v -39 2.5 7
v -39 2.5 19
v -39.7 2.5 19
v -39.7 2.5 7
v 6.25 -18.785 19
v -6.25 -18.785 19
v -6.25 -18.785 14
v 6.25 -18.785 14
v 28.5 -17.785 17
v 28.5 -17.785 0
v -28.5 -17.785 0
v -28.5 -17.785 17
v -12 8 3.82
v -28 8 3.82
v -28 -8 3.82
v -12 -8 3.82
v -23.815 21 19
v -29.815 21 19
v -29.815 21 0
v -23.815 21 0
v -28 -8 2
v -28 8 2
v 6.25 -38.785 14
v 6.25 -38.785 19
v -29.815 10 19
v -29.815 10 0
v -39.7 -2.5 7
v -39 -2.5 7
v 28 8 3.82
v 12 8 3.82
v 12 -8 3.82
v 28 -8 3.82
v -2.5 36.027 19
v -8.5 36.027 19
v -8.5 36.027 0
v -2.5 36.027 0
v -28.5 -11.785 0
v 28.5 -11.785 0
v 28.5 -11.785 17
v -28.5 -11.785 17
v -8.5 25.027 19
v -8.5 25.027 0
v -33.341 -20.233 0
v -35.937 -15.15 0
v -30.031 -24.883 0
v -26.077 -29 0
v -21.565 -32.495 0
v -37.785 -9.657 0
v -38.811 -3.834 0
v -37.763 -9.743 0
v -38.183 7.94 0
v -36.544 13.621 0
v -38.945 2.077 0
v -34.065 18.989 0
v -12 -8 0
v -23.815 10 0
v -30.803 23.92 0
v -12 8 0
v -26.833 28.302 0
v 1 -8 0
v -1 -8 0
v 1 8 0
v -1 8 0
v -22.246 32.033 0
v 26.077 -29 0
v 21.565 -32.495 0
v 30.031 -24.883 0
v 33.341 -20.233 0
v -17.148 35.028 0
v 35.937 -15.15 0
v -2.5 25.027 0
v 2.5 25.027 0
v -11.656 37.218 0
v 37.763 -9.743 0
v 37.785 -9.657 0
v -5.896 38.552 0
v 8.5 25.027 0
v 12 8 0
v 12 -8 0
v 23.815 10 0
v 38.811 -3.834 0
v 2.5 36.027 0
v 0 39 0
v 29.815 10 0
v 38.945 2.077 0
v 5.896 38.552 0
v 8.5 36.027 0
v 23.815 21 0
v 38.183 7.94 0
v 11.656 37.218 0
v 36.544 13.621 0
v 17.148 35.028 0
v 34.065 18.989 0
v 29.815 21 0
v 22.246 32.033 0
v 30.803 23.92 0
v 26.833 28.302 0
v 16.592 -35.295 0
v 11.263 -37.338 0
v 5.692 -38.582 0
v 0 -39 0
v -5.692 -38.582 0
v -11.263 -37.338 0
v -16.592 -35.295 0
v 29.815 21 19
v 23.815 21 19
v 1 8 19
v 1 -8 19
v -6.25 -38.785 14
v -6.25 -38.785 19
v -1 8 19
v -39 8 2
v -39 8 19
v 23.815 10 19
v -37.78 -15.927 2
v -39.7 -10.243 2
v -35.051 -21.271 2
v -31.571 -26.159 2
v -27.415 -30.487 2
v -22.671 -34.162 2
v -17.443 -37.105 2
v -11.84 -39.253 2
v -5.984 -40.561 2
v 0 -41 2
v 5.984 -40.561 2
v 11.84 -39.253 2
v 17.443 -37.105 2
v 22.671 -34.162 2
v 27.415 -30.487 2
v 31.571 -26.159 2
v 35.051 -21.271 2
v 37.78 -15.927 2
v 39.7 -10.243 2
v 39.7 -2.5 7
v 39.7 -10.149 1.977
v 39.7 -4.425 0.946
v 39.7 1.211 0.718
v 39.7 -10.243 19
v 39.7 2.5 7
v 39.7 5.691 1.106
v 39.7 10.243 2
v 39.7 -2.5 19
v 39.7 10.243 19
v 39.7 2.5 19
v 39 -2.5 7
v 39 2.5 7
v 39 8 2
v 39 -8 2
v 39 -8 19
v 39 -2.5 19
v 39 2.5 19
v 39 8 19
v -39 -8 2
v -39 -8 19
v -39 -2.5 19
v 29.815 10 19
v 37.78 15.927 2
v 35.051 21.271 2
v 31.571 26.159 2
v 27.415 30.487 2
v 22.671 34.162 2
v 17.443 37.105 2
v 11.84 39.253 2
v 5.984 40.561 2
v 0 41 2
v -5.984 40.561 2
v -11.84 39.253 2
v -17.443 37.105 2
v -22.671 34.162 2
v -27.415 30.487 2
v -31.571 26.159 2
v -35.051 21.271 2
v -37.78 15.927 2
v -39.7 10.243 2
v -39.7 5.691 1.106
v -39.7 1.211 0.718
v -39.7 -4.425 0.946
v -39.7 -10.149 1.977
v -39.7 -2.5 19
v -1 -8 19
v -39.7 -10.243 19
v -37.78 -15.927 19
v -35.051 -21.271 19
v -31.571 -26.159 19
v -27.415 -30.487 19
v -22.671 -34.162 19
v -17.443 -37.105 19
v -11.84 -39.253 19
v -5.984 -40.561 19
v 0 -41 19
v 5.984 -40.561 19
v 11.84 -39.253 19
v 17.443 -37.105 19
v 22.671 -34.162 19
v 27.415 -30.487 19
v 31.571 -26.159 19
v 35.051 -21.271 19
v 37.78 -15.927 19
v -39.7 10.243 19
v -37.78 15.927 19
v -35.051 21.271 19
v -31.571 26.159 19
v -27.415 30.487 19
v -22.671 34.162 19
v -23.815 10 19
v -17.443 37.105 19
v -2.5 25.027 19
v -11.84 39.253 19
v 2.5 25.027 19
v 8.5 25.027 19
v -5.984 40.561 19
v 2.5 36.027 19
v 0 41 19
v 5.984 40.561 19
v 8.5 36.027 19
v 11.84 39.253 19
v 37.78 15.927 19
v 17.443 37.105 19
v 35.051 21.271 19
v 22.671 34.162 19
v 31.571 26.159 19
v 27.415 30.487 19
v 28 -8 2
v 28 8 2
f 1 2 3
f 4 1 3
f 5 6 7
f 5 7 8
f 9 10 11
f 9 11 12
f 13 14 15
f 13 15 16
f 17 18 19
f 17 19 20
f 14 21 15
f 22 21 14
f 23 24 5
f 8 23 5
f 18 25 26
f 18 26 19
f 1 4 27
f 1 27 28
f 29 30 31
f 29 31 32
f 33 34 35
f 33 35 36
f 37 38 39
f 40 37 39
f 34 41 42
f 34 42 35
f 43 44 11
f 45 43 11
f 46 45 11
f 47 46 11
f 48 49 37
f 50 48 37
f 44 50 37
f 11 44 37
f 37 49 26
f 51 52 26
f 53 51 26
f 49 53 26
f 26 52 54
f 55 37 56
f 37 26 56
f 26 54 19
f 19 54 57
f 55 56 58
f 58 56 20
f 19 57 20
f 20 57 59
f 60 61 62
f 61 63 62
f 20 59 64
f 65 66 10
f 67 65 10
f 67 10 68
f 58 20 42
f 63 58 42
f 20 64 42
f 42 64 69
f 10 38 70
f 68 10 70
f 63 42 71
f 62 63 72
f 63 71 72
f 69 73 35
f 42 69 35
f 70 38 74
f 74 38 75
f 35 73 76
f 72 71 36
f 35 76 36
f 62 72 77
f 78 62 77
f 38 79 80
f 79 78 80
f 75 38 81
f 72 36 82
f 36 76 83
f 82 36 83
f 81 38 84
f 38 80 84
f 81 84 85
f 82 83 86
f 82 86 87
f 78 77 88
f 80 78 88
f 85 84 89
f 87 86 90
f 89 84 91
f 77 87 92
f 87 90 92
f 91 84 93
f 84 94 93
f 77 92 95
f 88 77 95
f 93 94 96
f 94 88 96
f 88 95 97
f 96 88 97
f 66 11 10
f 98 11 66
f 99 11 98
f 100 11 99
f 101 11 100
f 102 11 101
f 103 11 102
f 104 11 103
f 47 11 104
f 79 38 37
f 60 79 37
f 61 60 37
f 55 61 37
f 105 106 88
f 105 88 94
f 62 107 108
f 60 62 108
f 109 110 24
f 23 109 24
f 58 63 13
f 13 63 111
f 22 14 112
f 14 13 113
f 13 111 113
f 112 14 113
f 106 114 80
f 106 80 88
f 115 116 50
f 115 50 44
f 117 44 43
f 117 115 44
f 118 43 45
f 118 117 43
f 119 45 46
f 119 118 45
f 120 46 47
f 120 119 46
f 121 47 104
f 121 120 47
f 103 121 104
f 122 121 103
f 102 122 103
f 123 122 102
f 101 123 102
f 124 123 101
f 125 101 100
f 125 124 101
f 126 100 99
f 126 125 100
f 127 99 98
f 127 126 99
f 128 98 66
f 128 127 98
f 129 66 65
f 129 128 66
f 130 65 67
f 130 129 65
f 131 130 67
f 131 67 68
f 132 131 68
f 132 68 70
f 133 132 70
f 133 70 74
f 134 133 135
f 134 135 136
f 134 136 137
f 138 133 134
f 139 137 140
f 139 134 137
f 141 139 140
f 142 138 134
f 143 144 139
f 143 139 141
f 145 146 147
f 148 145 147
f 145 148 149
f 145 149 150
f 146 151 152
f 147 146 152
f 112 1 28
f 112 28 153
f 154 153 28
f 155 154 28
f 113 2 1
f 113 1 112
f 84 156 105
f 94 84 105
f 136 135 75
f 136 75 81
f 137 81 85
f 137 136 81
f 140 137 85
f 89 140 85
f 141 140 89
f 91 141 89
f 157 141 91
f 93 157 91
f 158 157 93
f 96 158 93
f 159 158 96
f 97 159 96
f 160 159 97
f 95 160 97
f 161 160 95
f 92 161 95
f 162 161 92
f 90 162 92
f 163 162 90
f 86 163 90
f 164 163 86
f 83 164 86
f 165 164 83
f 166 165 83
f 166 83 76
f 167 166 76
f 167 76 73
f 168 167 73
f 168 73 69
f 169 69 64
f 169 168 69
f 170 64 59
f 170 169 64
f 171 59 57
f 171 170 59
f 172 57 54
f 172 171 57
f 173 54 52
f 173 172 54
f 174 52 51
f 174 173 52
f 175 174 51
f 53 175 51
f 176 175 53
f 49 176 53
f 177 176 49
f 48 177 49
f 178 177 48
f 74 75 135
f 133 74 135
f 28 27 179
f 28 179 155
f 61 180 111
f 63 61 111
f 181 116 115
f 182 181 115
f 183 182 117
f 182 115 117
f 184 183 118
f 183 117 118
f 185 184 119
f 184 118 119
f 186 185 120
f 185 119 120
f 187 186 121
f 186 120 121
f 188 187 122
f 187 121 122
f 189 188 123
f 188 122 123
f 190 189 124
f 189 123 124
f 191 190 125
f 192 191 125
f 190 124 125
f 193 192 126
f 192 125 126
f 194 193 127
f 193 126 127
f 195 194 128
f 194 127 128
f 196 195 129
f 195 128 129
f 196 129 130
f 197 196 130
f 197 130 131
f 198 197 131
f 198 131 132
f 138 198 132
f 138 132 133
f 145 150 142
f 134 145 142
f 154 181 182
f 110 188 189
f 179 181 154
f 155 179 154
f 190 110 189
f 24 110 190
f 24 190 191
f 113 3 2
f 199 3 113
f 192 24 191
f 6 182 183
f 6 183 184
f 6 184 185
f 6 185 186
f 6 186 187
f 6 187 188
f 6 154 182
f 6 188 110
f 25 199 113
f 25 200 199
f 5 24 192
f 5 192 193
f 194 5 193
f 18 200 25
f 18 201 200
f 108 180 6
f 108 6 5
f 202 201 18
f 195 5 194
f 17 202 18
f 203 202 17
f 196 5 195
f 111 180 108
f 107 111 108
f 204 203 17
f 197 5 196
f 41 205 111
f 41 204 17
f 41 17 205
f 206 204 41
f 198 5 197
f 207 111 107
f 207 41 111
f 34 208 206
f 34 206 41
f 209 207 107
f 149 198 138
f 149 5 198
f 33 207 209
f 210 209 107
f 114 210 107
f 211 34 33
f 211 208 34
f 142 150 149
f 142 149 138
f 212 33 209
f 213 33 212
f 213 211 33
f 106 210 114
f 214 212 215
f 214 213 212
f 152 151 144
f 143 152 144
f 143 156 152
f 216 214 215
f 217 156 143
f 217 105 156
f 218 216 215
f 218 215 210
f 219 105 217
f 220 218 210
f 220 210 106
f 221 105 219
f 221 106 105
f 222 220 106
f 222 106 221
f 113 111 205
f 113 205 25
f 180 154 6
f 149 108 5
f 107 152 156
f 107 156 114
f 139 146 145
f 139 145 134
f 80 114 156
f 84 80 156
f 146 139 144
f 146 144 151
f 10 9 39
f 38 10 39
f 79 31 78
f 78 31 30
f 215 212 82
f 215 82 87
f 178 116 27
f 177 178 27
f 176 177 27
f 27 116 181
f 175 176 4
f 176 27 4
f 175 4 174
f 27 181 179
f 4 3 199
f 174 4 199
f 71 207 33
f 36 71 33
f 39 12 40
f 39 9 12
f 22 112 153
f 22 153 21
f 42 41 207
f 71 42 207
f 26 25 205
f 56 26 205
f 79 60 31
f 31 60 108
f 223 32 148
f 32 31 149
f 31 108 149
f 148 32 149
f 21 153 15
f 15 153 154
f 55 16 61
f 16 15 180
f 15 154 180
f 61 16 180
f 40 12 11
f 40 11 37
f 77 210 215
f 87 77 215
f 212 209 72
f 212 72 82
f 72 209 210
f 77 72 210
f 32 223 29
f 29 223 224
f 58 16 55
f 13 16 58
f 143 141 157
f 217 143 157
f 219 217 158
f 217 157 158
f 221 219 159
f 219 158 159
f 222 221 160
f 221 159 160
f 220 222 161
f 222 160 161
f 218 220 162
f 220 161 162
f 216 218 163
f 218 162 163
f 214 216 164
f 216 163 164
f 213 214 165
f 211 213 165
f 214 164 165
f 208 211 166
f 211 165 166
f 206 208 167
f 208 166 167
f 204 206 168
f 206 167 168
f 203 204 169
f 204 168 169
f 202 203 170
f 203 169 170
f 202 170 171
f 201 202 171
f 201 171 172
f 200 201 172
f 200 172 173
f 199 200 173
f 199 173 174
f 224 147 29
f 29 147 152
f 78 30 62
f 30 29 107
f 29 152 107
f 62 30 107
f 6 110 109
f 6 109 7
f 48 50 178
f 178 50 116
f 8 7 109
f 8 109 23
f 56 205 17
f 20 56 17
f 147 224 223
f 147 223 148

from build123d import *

# Parameters (mm, degrees)
F0_R        = 41
F1_DEPTH    = 19
F3_DEPTH    = 17
F4_W        = 6
F4_H        = 11
F4_W_2      = 11
F4_H_2      = 16
F4_W_3      = 10.7800960541
F4_H_3      = 45.1917052269
F5_DEPTH    = 19.001
F7_START    = -12
F6_W        = 0.7
F6_H        = 5
F7_DEPTH    = 5
F8_W        = 16
F8_H        = 16
F9_DEPTH    = 1.82
F10_C1_SIZE = 2
F10_C2_SIZE = 1.9999
F11_W       = 12.5
F11_H       = 20
F12_DEPTH   = 5
F13_W       = 6
F13_H       = 35
F14_DEPTH   = 28.5


# Not quite as in the source:
# - a fillet or chamfer is up to 0.001 mm smaller than in the source, because OpenCascade refuses the exact size


with BuildPart() as f1:
    # F0 (on Top) → F1 (new body)
    with BuildSketch(Plane.XY):
        Circle(F0_R)
    extrude(amount=F1_DEPTH)

    # F2 (on face) → F3 (cut)
    with BuildSketch(Plane.XY.offset(19)):
        Polygon((39, 2.5), (39, 8), (1, 8), (1, -8), (39, -8), (39, -2.5), align=None)
        Polygon((-39, 8), (-39, 2.5), (-39, -2.5), (-39, -8), (-1, -8), (-1, 8), align=None)
        with BuildLine():
            Line((43, 2.5), (40.9237095093, 2.5))
            ThreePointArc((40.9237095093, 2.5), (40.9809229391, 1.2505818885), (41, 0))
            ThreePointArc((41, 0), (40.9809229391, -1.2505818885), (40.9237095093, -2.5))
            Line((40.9237095093, -2.5), (43, -2.5))
            Line((43, -2.5), (43, 2.5))
        make_face()
        with BuildLine():
            ThreePointArc((-40.9237095093, -2.5), (-41, 0), (-40.9237095093, 2.5))
            Line((-40.9237095093, 2.5), (-43, 2.5))
            Line((-43, 2.5), (-43, -2.5))
            Line((-43, -2.5), (-40.9237095093, -2.5))
        make_face()
        with BuildLine():
            Line((40.9237095093, 2.5), (39, 2.5))
            Line((39, 2.5), (39, -2.5))
            Line((39, -2.5), (40.9237095093, -2.5))
            ThreePointArc((40.9237095093, -2.5), (40.9809229391, -1.2505818885), (41, 0))
            ThreePointArc((41, 0), (40.9809229391, 1.2505818885), (40.9237095093, 2.5))
        make_face()
        with BuildLine():
            Line((-39, 2.5), (-40.9237095093, 2.5))
            ThreePointArc((-40.9237095093, 2.5), (-41, 0), (-40.9237095093, -2.5))
            Line((-40.9237095093, -2.5), (-39, -2.5))
            Line((-39, -2.5), (-39, 2.5))
        make_face()
    extrude(amount=-F3_DEPTH, mode=Mode.SUBTRACT)

    # F4 (on face) → F5 (cut, through all)
    with BuildSketch(Plane.XY.offset(19)):
        with Locations((-26.8149985671, 15.5)):
            Rectangle(F4_W, F4_H)
        with Locations((26.8149985671, 15.5)):
            Rectangle(F4_W, F4_H)
        with Locations((-5.5, 30.5270385295)):
            Rectangle(F4_W, F4_H)
        with Locations((5.5, 30.5270385295)):
            Rectangle(F4_W, F4_H)
        with Locations((-6.5, 0)):
            Rectangle(F4_W_2, F4_H_2)
        with Locations((6.5, 0)):
            Rectangle(F4_W_2, F4_H_2)
        with Locations((-45.090048027, 0)):
            Rectangle(F4_W_3, F4_H_3)
        with Locations((45.090048027, 0)):
            Rectangle(F4_W_3, F4_H_3)
    extrude(amount=-F5_DEPTH, mode=Mode.SUBTRACT)

    # F6 (on face) → F7 (join)
    with BuildSketch(Plane.XY.offset(19).offset(F7_START)):
        with Locations((-39.35, 0)):
            Rectangle(F6_W, F6_H)
        with Locations((39.35, 0)):
            Rectangle(F6_W, F6_H)
    extrude(amount=-F7_DEPTH)

    # F8 (on face) → F9 (join)
    with BuildSketch(Plane.XY.offset(2)):
        with Locations((-20, 0)):
            Rectangle(F8_W, F8_H)
        with Locations((20, 0)):
            Rectangle(F8_W, F8_H)
    extrude(amount=F9_DEPTH)

    # F10: chamfer of 2 on 2 edges, made by hand

    # F10_c1
    f10_c1_edges = [f1.edges().sort_by_distance(p)[0] for p in [
        (0, -41, 0),
    ]]
    chamfer(f10_c1_edges, length=F10_C1_SIZE)

    # F10_c2 (size 2 in the source; OpenCascade refuses exactly that, so slightly less here)
    f10_c2_edges = [f1.edges().sort_by_distance(p)[0] for p in [
        (0, 41, 0),
    ]]
    chamfer(f10_c2_edges, length=F10_C2_SIZE)

    # F11 (on face) → F12 (cut)
    with BuildSketch(Plane.XY.offset(19)):
        with Locations((0, -28.7845470011)):
            Rectangle(F11_W, F11_H)
    extrude(amount=-F12_DEPTH, mode=Mode.SUBTRACT)

    # F13 (on Right) → F14 (cut, symmetric)
    with BuildSketch(Plane.YZ):
        with Locations((-14.7845470011, -0.5)):
            Rectangle(F13_W, F13_H)
    extrude(amount=F14_DEPTH, both=True, mode=Mode.SUBTRACT)


solid = f1.part
